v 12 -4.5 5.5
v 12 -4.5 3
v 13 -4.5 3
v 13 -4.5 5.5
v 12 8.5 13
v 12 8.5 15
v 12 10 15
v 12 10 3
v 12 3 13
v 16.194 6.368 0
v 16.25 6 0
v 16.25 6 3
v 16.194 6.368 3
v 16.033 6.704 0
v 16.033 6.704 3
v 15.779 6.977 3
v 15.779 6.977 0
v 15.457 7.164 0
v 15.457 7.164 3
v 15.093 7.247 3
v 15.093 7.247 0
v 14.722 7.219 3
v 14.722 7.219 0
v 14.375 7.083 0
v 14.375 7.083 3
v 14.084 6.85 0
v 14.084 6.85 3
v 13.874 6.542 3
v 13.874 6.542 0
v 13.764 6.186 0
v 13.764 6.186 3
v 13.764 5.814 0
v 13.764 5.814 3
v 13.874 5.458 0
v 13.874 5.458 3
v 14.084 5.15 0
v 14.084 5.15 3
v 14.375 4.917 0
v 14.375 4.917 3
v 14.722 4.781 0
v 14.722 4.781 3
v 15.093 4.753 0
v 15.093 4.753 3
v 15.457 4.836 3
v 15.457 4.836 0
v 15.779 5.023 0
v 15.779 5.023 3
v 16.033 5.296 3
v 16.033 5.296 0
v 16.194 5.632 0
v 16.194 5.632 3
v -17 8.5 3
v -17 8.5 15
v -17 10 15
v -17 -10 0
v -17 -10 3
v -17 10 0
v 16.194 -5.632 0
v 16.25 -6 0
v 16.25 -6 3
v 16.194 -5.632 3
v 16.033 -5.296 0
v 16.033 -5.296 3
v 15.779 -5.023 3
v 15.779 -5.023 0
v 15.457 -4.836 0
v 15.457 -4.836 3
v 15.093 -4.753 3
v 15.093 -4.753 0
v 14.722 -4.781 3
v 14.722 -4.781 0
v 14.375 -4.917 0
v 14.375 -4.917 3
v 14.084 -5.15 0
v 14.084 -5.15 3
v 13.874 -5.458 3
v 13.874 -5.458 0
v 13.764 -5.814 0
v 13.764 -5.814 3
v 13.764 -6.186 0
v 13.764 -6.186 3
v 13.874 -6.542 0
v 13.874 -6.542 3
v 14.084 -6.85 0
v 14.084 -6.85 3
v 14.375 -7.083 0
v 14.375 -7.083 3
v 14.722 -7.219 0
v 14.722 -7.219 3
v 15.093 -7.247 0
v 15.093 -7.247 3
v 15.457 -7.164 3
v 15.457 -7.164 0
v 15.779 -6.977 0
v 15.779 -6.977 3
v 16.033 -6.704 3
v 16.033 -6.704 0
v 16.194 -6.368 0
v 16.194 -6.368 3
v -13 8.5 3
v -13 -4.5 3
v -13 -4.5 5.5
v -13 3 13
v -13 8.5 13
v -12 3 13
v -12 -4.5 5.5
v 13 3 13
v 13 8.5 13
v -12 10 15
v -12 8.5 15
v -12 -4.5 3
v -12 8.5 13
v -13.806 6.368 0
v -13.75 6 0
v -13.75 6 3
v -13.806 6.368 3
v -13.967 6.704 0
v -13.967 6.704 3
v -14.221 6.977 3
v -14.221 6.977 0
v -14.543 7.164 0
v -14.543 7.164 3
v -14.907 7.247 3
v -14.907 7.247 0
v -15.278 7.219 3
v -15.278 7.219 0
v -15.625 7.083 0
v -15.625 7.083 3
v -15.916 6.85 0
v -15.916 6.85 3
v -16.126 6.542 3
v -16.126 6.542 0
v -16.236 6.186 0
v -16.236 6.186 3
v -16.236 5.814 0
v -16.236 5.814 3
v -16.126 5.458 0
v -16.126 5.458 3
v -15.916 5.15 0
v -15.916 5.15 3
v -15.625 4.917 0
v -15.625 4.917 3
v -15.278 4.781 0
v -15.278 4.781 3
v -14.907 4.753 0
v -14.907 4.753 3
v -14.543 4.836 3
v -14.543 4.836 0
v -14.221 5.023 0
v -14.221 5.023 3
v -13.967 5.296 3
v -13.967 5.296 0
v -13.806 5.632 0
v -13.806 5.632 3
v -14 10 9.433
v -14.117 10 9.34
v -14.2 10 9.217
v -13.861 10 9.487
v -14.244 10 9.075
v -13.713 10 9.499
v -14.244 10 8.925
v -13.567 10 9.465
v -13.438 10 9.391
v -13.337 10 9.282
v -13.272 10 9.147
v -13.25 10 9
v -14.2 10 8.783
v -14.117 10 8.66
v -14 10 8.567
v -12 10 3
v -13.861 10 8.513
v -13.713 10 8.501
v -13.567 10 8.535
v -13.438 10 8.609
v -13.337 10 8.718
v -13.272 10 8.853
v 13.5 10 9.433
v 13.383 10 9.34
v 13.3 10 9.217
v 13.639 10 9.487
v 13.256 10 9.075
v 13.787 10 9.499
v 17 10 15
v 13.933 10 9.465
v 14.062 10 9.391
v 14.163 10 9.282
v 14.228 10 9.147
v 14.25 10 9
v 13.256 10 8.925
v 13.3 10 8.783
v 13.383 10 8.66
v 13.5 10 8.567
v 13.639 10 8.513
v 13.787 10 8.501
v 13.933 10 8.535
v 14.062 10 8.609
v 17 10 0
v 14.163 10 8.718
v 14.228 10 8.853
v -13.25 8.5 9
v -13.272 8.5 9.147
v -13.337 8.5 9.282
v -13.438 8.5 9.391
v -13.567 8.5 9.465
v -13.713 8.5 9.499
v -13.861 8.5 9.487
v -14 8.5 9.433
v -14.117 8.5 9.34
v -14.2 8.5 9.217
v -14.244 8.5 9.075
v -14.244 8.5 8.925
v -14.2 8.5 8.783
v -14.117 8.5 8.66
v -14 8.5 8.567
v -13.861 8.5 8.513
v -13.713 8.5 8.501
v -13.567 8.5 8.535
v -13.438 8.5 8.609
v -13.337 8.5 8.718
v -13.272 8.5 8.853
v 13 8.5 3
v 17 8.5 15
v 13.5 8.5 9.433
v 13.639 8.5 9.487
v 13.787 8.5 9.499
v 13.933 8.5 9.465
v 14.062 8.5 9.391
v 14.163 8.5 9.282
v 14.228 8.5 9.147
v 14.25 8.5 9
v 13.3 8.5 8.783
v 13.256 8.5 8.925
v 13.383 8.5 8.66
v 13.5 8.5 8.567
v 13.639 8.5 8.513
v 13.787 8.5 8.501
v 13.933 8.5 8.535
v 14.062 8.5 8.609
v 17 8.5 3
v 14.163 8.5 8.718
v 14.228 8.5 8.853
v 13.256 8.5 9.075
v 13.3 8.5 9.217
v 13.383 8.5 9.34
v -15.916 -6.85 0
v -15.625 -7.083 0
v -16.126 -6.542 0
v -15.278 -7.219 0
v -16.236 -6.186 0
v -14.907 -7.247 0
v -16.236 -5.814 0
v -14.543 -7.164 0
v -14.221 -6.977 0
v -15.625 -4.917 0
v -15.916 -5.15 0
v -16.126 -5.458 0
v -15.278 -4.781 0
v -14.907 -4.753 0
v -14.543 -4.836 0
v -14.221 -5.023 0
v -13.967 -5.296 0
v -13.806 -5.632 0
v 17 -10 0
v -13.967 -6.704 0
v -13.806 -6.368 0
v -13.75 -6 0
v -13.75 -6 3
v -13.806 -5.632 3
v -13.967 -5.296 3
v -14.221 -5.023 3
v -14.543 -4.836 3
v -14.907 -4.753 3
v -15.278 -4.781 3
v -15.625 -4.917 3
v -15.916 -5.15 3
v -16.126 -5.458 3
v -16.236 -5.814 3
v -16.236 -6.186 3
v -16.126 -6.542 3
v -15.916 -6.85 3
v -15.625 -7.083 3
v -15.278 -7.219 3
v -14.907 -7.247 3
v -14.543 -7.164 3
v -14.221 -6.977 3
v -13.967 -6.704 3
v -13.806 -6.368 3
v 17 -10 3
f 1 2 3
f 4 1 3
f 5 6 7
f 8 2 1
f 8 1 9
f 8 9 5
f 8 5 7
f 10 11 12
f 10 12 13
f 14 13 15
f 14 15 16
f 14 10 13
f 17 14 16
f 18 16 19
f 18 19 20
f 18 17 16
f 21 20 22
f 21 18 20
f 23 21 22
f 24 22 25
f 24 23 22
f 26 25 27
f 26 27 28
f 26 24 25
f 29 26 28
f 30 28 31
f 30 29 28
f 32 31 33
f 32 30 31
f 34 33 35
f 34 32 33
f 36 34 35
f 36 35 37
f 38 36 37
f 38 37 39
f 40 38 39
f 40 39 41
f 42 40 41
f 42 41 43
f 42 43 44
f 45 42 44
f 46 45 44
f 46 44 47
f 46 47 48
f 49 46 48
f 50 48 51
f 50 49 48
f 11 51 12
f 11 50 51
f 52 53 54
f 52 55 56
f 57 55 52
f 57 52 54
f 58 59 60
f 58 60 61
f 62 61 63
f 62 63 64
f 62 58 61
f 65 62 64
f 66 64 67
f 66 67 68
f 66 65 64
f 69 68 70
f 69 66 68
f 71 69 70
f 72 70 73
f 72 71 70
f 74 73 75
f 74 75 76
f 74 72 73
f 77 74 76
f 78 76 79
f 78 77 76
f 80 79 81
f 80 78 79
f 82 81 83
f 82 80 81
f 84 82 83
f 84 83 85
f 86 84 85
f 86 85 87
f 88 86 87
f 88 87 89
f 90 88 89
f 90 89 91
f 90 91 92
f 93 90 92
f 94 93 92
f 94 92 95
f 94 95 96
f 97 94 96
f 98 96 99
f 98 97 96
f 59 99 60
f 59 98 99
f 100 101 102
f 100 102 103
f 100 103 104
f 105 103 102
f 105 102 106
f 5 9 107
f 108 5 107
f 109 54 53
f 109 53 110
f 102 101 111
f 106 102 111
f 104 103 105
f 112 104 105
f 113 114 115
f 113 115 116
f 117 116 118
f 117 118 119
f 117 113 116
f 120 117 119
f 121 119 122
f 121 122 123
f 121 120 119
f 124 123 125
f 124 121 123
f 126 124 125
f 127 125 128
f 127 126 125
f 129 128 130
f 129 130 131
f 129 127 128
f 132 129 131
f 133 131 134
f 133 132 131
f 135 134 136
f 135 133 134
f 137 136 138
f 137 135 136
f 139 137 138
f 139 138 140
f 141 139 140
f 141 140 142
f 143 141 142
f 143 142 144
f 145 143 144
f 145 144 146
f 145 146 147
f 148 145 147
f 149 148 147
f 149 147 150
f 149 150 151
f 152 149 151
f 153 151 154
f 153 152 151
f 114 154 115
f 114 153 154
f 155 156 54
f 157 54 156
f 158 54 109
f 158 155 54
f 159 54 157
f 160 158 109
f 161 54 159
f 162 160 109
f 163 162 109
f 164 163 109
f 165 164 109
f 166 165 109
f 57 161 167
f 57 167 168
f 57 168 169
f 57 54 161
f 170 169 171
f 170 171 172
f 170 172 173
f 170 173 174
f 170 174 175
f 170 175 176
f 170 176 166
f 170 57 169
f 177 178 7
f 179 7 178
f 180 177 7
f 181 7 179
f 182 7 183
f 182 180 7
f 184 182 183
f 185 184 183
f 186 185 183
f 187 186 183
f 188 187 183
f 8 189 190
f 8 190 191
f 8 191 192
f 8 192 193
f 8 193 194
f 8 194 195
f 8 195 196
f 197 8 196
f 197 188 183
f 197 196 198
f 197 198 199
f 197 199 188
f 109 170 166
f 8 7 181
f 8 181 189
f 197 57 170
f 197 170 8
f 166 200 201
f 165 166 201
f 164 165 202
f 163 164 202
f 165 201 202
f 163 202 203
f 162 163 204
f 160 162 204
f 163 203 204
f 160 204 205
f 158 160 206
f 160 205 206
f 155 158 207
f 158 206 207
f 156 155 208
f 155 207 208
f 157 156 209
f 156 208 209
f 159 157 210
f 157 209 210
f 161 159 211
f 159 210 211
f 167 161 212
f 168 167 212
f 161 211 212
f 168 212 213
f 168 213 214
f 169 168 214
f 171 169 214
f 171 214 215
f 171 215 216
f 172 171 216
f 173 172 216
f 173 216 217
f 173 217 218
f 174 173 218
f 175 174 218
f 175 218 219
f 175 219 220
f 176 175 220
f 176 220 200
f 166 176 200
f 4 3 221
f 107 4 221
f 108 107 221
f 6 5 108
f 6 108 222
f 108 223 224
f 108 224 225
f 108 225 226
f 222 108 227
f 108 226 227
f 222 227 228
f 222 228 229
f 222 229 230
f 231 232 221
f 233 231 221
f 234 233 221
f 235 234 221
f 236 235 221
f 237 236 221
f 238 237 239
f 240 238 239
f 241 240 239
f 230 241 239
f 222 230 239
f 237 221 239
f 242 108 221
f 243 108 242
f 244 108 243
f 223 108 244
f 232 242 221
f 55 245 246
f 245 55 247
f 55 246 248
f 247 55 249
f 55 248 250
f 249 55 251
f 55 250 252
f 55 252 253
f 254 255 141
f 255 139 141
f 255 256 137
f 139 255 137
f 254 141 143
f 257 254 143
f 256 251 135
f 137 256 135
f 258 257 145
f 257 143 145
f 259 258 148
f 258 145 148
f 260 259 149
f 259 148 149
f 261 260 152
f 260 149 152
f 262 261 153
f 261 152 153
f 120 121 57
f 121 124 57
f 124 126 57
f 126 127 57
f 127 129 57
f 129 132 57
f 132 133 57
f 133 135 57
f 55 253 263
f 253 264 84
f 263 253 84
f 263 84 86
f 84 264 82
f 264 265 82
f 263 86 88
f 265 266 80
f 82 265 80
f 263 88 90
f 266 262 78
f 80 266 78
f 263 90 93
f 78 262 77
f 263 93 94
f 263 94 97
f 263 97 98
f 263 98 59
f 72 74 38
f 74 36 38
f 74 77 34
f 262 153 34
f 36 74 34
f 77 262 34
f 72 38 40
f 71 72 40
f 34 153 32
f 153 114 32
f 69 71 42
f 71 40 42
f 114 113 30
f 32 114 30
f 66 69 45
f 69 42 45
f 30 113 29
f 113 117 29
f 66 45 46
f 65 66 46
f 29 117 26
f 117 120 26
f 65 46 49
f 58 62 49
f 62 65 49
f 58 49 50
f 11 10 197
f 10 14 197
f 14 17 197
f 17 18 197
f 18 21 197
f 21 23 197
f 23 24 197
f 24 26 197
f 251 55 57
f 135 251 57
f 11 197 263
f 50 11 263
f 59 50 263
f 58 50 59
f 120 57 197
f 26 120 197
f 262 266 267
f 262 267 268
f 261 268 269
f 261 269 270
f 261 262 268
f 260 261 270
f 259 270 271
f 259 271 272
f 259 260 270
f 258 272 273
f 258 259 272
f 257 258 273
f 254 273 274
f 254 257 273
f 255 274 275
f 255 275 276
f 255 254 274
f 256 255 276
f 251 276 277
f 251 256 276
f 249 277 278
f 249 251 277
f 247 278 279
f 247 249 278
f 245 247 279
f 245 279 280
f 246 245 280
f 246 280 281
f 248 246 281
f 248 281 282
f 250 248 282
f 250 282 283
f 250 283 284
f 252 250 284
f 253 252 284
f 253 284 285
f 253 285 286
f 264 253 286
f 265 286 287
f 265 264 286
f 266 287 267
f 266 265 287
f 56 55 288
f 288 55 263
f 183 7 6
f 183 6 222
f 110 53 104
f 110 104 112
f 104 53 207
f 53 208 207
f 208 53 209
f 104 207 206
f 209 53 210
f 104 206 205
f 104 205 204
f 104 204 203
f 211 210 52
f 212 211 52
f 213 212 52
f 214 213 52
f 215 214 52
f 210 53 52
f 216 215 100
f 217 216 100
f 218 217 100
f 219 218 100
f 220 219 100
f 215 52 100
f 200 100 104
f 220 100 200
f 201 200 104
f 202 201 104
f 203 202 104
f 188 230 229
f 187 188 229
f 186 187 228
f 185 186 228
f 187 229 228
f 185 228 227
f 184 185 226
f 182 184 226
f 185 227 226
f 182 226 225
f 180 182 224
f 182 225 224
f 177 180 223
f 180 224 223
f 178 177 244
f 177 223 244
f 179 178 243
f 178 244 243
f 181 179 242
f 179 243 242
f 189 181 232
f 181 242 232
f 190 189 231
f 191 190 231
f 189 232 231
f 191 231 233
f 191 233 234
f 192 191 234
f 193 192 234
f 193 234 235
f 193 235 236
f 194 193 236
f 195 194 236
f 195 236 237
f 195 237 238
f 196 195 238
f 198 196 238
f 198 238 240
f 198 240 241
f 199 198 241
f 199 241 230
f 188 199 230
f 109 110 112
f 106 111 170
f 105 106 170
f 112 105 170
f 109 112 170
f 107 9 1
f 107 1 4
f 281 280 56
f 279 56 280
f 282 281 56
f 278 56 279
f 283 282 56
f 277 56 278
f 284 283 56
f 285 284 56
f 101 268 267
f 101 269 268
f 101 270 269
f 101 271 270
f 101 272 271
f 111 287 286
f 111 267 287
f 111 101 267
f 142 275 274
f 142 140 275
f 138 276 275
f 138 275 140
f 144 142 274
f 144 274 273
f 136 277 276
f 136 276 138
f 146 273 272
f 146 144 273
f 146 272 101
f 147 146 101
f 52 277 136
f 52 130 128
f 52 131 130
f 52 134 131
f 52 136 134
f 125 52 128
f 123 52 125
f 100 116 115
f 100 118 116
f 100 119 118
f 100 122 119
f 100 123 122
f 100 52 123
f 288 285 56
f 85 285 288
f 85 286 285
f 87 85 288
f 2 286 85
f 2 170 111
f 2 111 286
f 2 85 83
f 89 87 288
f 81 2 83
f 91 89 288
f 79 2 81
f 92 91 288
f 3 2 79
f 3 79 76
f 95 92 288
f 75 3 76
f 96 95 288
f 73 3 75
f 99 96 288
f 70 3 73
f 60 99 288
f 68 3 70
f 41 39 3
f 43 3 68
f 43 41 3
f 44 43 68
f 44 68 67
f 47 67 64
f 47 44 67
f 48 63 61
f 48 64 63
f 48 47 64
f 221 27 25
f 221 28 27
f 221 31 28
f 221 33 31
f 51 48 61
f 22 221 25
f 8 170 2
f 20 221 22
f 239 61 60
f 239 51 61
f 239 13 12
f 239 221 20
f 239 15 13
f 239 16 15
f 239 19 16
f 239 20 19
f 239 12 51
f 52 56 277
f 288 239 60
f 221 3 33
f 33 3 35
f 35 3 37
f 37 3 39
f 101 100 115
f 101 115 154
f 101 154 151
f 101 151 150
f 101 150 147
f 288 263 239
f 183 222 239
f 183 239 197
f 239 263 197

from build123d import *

# Parameters (mm, degrees)
F0_W     = 34
F0_H     = 20
F0_R     = 1.25
F1_DEPTH = 3
F2_W     = 5
F2_H     = 1.5
F3_DEPTH = 12
F4_W     = 1
F4_H     = 13
F5_DEPTH = 10
F6_SIZE  = 7.5
F8_D     = 1


# Not quite as in the source:
# - a feature names something its author has since deleted; it is built from what else it names


with BuildPart() as f1:
    # F0 (on Top) → F1 (new body)
    with BuildSketch(Plane.XY):
        Rectangle(F0_W, F0_H)
        with Locations((-15, -6)):
            Circle(F0_R, mode=Mode.SUBTRACT)
        with Locations((15, -6)):
            Circle(F0_R, mode=Mode.SUBTRACT)
        with Locations((-15, 6)):
            Circle(F0_R, mode=Mode.SUBTRACT)
        with Locations((15, 6)):
            Circle(F0_R, mode=Mode.SUBTRACT)
    extrude(amount=F1_DEPTH)

    # F2 (on face) → F3 (join)
    with BuildSketch(Plane.XY.offset(3)):
        with Locations((-14.5, 9.25)):
            Rectangle(F2_W, F2_H)
        with Locations((14.5, 9.25)):
            Rectangle(F2_W, F2_H)
    extrude(amount=F3_DEPTH)

    # F4 (on face) → F5 (join)
    with BuildSketch(Plane.XY.offset(3)):
        with Locations((-12.5, 2)):
            Rectangle(F4_W, F4_H)
        with Locations((12.5, 2)):
            Rectangle(F4_W, F4_H)
    extrude(amount=F5_DEPTH)

    # F6
    f6_edges = [f1.edges().sort_by_distance(p)[0] for p in [
        (-12.5, -4.5, 13),
        (12.5, -4.5, 13),
    ]]
    chamfer(f6_edges, length=F6_SIZE)

    # F8 (through all)
    with Locations(Plane(origin=(0, 10, 0), x_dir=(-1, 0, 0), z_dir=(0, 1, 0))):
        with Locations((13.75, 9), (-13.75, 9)):
            Hole(F8_D / 2)


solid = f1.part
